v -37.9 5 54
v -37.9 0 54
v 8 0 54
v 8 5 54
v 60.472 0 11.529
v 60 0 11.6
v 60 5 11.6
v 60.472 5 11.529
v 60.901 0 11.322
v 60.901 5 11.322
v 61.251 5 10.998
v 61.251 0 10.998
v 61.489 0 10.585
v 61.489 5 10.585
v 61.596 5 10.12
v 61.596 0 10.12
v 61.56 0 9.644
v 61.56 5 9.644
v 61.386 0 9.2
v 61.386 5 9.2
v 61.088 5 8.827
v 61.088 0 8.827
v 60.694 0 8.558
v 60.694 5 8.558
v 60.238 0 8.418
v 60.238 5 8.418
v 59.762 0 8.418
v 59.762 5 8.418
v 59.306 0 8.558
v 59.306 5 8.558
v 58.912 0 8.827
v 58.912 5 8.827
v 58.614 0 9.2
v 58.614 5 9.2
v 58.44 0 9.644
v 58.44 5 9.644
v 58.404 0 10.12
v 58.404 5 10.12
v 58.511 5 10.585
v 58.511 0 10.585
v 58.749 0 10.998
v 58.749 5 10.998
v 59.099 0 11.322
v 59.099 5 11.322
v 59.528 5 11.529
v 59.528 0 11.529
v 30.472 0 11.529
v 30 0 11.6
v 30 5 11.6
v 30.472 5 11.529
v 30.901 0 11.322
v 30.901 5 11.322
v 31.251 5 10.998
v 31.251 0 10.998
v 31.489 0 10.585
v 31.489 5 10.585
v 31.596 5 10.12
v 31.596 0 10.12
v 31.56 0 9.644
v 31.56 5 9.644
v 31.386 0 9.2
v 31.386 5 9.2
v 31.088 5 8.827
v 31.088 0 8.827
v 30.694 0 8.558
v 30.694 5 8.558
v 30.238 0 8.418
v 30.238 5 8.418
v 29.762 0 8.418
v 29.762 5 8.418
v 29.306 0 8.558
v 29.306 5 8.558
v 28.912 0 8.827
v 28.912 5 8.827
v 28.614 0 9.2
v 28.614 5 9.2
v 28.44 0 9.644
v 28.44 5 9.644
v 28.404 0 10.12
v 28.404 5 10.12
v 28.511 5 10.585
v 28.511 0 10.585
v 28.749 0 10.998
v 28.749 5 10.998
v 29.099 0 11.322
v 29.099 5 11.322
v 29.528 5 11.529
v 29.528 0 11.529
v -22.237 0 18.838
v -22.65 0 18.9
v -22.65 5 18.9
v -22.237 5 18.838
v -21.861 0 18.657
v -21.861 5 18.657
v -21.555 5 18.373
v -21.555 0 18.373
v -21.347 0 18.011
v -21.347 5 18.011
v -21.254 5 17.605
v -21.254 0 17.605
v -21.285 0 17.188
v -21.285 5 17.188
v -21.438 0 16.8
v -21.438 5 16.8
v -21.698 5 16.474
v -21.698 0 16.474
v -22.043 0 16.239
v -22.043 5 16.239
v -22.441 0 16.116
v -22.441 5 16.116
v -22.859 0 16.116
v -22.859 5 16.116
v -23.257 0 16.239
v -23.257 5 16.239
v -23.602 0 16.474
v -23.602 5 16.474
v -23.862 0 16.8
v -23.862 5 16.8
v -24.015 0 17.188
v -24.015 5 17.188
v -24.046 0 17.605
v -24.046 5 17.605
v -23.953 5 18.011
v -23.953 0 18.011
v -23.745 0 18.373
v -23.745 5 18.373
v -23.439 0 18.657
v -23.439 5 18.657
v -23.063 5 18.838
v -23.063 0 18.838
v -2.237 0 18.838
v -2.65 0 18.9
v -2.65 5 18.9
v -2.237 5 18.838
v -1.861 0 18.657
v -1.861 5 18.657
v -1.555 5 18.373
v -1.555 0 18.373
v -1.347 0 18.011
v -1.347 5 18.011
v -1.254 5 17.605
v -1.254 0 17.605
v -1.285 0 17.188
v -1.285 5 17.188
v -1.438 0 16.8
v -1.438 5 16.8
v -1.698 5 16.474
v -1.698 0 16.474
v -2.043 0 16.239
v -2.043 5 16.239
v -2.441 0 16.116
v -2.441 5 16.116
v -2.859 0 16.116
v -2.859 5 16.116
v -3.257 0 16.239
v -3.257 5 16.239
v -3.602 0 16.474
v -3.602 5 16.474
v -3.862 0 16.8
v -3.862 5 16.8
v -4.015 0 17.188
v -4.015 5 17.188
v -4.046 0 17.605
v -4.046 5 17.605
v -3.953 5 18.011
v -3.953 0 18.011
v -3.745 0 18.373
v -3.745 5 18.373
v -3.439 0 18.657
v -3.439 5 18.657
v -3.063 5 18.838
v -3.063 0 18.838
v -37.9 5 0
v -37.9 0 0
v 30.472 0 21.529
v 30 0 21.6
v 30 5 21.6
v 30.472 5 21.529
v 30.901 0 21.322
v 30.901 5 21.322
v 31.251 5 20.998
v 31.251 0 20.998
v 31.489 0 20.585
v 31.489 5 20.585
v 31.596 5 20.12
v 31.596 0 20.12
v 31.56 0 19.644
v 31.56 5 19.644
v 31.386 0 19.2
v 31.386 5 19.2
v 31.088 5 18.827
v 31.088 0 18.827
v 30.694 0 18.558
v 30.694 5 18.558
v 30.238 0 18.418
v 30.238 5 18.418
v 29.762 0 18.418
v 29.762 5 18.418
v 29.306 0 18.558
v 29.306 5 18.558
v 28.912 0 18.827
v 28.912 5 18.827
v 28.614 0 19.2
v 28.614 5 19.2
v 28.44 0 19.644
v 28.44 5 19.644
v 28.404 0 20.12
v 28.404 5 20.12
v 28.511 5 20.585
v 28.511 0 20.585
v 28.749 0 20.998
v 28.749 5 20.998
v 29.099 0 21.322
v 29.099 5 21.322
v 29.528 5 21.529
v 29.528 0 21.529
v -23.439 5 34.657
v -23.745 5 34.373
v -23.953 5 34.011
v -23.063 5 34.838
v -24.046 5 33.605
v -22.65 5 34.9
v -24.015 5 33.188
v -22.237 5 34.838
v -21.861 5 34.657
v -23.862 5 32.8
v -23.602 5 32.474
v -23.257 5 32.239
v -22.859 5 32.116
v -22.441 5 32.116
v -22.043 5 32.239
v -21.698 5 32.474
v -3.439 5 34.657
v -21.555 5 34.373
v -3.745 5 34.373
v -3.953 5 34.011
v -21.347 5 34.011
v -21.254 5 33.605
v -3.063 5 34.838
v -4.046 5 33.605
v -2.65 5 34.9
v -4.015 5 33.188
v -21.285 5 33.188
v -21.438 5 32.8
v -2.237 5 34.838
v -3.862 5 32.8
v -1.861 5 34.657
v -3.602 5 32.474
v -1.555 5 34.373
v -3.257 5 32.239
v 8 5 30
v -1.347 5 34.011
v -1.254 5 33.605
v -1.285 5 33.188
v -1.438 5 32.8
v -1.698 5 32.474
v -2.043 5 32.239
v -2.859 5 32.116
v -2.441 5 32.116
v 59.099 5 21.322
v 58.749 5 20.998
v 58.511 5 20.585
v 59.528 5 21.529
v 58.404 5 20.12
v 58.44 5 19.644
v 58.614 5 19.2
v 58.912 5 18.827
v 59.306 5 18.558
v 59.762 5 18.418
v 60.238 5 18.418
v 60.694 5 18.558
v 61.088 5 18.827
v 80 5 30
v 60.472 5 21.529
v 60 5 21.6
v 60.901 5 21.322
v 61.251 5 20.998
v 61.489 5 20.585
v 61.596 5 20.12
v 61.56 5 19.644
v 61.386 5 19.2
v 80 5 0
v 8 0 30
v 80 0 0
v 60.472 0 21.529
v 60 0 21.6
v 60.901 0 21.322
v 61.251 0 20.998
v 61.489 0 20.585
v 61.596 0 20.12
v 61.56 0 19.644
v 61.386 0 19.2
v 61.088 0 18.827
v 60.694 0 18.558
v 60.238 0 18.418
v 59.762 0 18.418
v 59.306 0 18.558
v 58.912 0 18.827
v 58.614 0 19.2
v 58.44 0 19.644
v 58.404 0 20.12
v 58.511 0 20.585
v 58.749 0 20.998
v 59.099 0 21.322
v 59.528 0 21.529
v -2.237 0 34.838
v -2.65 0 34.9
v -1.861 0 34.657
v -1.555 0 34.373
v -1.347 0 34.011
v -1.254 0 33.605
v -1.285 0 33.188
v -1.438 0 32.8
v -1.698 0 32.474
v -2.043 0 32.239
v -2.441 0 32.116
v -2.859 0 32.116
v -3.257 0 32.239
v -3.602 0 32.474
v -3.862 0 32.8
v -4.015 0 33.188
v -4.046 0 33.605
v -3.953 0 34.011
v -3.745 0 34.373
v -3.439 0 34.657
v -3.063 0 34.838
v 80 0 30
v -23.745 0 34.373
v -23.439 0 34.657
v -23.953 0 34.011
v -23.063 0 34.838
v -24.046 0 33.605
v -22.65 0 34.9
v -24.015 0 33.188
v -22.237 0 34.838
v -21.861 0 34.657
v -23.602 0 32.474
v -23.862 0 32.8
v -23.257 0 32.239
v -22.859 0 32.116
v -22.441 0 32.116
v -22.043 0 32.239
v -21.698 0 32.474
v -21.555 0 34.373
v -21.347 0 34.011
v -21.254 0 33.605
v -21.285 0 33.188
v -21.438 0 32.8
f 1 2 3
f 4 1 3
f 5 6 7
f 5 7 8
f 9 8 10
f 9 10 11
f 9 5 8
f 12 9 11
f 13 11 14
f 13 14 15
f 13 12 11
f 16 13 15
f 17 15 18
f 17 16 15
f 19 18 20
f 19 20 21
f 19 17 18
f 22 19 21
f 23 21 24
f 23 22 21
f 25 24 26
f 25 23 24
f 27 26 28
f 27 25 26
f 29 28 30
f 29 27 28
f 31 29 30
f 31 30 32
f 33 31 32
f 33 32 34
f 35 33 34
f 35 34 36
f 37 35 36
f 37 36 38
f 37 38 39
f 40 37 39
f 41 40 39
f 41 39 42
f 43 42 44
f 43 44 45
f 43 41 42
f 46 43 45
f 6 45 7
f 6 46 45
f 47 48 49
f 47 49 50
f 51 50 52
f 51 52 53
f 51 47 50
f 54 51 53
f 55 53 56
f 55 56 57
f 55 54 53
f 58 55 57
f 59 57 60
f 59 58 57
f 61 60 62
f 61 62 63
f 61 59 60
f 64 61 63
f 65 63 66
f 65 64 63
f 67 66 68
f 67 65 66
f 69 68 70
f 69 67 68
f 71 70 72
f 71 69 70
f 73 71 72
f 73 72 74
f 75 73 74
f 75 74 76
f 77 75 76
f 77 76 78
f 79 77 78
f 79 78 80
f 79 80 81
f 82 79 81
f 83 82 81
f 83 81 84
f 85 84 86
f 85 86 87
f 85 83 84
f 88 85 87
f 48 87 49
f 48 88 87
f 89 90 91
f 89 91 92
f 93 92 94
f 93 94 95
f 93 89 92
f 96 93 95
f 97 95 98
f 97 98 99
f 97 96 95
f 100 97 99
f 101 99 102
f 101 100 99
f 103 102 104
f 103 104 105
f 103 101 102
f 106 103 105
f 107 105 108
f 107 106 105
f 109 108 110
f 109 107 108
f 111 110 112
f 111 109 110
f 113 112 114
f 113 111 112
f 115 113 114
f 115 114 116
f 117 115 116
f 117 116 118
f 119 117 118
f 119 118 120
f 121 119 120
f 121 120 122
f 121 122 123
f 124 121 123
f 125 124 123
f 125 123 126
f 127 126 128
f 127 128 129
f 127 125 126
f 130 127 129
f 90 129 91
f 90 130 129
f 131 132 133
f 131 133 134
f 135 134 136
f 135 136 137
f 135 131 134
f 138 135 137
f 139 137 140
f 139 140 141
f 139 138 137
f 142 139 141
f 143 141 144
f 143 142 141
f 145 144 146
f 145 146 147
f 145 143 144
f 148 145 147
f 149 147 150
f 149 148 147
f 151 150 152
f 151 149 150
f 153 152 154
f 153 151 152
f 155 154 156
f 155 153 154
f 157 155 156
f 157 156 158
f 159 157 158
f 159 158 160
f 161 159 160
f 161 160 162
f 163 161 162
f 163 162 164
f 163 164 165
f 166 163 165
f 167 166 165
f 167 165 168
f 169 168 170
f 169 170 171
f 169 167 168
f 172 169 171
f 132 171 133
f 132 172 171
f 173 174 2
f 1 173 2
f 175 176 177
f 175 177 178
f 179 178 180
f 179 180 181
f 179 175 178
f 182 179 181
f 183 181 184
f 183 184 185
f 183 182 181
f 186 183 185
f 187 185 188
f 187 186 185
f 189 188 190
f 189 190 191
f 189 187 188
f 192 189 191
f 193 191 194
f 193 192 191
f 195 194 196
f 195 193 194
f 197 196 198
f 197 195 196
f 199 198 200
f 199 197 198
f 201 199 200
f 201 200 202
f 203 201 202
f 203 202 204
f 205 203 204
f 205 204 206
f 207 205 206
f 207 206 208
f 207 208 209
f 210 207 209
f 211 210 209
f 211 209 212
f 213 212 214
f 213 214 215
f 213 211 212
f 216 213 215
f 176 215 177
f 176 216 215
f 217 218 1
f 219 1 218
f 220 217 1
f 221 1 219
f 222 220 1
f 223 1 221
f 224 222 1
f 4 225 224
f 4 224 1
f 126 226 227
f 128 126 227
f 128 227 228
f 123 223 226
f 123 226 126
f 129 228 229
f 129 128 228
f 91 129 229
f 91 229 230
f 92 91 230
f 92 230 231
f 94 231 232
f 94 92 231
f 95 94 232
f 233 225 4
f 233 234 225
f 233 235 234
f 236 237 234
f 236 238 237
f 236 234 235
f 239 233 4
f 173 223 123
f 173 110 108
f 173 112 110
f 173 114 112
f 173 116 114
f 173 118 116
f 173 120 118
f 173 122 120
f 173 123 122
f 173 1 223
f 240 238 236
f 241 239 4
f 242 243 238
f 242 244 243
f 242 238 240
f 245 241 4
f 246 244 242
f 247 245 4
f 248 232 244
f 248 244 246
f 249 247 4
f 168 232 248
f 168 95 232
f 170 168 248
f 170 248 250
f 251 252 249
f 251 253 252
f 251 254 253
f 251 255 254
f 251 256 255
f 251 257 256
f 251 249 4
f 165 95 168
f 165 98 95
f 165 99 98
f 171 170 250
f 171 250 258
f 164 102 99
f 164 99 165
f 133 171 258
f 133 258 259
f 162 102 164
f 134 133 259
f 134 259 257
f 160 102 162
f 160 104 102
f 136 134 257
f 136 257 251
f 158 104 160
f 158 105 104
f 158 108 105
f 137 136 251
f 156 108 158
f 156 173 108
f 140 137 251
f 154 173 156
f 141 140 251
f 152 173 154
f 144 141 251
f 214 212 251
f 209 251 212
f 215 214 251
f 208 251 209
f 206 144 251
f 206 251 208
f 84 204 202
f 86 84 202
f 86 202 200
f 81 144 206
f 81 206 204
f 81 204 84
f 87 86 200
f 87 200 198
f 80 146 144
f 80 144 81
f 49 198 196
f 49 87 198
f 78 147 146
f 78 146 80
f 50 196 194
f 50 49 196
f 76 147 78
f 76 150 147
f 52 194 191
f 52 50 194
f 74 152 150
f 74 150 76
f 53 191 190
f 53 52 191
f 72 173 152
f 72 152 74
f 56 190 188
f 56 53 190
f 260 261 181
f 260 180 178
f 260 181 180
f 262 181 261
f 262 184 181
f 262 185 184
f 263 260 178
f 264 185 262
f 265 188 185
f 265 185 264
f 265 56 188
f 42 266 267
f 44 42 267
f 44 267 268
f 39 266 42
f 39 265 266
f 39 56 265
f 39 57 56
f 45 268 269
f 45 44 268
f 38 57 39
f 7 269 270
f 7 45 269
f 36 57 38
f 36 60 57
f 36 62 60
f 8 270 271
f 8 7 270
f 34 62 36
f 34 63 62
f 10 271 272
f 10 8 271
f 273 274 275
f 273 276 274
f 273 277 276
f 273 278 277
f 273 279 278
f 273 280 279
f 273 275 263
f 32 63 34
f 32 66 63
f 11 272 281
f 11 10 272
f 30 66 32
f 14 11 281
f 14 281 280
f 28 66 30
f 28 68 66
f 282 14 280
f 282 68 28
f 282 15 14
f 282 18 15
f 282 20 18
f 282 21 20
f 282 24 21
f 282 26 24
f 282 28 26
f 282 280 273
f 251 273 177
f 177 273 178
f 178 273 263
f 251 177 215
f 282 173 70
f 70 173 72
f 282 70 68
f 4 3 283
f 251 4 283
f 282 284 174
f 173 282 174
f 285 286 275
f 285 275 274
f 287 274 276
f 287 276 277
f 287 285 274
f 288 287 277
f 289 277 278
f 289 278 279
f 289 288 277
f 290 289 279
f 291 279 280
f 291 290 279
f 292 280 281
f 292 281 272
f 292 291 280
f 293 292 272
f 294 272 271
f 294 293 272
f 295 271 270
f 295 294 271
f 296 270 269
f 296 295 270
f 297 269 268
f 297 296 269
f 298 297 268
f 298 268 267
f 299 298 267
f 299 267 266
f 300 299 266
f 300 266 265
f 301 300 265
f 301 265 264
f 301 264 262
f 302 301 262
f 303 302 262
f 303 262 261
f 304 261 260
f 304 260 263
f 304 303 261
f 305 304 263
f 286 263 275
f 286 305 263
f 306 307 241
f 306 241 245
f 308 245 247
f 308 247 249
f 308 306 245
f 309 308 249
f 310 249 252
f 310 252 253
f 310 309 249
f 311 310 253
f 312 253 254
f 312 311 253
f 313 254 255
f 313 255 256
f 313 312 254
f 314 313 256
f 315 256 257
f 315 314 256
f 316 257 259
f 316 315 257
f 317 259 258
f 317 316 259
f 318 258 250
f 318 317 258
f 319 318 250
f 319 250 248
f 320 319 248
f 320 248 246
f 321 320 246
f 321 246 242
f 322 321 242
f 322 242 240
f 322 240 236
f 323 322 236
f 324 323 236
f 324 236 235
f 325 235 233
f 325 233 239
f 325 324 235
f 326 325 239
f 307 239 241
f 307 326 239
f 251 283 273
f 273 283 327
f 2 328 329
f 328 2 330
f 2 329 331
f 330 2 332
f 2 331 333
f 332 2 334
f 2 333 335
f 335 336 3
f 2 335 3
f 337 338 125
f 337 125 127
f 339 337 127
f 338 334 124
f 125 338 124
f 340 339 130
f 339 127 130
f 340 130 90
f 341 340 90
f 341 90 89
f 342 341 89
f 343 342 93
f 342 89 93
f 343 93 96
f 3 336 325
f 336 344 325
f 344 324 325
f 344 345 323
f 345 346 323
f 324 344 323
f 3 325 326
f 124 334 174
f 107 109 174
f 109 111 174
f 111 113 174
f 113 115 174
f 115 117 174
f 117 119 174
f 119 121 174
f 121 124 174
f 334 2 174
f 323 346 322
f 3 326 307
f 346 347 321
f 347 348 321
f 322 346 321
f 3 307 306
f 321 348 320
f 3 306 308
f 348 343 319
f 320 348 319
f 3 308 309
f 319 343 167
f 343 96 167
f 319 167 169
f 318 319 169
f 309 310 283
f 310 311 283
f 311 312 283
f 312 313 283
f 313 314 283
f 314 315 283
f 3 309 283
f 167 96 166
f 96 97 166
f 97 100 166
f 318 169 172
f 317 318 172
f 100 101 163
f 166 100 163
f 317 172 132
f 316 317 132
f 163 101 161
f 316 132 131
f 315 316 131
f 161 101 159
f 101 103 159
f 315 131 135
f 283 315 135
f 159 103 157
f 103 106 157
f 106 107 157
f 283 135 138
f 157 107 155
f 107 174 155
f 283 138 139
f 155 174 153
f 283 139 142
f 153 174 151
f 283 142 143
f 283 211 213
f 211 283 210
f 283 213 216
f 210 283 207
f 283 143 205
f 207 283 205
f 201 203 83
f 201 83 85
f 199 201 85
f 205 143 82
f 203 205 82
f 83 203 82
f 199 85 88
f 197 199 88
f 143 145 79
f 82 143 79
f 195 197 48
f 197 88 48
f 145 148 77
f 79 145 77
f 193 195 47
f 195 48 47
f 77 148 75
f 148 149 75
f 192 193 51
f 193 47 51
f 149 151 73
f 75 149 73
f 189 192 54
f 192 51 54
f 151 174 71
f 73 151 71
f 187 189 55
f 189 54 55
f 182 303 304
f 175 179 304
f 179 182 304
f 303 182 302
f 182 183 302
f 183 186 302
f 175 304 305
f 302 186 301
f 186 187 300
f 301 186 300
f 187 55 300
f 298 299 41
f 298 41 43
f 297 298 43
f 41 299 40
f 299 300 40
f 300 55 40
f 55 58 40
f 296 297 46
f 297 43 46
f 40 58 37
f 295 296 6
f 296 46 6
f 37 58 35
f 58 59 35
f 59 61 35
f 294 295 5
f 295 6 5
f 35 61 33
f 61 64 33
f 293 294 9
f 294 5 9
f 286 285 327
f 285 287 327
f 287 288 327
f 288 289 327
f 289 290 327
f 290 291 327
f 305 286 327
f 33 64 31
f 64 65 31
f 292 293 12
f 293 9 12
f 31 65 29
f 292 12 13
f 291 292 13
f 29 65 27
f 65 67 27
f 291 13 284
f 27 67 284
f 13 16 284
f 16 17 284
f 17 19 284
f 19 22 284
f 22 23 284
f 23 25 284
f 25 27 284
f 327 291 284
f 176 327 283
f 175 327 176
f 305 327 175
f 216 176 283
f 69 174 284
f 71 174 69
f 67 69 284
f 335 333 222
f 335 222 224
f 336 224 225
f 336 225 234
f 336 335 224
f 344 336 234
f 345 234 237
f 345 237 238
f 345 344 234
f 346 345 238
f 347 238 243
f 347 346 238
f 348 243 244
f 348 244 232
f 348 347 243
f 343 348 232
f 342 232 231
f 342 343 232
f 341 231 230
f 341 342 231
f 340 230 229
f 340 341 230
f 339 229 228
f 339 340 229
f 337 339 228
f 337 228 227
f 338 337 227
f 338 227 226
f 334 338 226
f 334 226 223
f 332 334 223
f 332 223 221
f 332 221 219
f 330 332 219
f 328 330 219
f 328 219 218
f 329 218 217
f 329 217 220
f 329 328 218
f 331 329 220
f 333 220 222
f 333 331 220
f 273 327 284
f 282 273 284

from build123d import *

# Parameters (mm, degrees)
SKETCH1_R           = 1.4
SKETCH1_R_2         = 1.6
SKETCH1_W           = 8
SKETCH1_H           = 24
BOSS_EXTRUDE1_DEPTH = 5


with BuildPart() as part:
    # Sketch1 → Boss-Extrude1 (new body)
    # profile 1 of 3: a face of its own
    with BuildSketch(Plane(origin=(0, 0, 0), x_dir=(1, 0, 0), z_dir=(0, 1, 0))):
        Polygon((0, -30), (0, 0), (-37.9, 0), (-37.9, -35), (-37.9, -54), (0, -54), align=None)
        with Locations(Location((-22.65, -33.5, 0), (0, 0, 270))):
            Circle(SKETCH1_R, mode=Mode.SUBTRACT)
        with Locations(Location((-2.65, -33.5, 0), (0, 0, 270))):
            Circle(SKETCH1_R, mode=Mode.SUBTRACT)
        with Locations(Location((-22.65, -17.5, 0), (0, 0, 270))):
            Circle(SKETCH1_R, mode=Mode.SUBTRACT)
        with Locations(Location((-2.65, -17.5, 0), (0, 0, 270))):
            Circle(SKETCH1_R, mode=Mode.SUBTRACT)
    # profile 2 of 3: a face of its own
    with BuildSketch(Plane(origin=(0, 0, 0), x_dir=(1, 0, 0), z_dir=(0, 1, 0))):
        Polygon((80, 0), (0, 0), (0, -30), (8, -30), (80, -30), align=None)
        with Locations(Location((30, -20, 0), (0, 0, 270))):
            Circle(SKETCH1_R_2, mode=Mode.SUBTRACT)
        with Locations(Location((60, -20, 0), (0, 0, 270))):
            Circle(SKETCH1_R_2, mode=Mode.SUBTRACT)
        with Locations(Location((30, -10, 0), (0, 0, 270))):
            Circle(SKETCH1_R_2, mode=Mode.SUBTRACT)
        with Locations(Location((60, -10, 0), (0, 0, 270))):
            Circle(SKETCH1_R_2, mode=Mode.SUBTRACT)
    # profile 3 of 3: a face of its own
    with BuildSketch(Plane(origin=(0, 0, 0), x_dir=(1, 0, 0), z_dir=(0, 1, 0))):
        with Locations((4, -42)):
            Rectangle(SKETCH1_W, SKETCH1_H)
    extrude(amount=BOSS_EXTRUDE1_DEPTH)


solid = part.part
